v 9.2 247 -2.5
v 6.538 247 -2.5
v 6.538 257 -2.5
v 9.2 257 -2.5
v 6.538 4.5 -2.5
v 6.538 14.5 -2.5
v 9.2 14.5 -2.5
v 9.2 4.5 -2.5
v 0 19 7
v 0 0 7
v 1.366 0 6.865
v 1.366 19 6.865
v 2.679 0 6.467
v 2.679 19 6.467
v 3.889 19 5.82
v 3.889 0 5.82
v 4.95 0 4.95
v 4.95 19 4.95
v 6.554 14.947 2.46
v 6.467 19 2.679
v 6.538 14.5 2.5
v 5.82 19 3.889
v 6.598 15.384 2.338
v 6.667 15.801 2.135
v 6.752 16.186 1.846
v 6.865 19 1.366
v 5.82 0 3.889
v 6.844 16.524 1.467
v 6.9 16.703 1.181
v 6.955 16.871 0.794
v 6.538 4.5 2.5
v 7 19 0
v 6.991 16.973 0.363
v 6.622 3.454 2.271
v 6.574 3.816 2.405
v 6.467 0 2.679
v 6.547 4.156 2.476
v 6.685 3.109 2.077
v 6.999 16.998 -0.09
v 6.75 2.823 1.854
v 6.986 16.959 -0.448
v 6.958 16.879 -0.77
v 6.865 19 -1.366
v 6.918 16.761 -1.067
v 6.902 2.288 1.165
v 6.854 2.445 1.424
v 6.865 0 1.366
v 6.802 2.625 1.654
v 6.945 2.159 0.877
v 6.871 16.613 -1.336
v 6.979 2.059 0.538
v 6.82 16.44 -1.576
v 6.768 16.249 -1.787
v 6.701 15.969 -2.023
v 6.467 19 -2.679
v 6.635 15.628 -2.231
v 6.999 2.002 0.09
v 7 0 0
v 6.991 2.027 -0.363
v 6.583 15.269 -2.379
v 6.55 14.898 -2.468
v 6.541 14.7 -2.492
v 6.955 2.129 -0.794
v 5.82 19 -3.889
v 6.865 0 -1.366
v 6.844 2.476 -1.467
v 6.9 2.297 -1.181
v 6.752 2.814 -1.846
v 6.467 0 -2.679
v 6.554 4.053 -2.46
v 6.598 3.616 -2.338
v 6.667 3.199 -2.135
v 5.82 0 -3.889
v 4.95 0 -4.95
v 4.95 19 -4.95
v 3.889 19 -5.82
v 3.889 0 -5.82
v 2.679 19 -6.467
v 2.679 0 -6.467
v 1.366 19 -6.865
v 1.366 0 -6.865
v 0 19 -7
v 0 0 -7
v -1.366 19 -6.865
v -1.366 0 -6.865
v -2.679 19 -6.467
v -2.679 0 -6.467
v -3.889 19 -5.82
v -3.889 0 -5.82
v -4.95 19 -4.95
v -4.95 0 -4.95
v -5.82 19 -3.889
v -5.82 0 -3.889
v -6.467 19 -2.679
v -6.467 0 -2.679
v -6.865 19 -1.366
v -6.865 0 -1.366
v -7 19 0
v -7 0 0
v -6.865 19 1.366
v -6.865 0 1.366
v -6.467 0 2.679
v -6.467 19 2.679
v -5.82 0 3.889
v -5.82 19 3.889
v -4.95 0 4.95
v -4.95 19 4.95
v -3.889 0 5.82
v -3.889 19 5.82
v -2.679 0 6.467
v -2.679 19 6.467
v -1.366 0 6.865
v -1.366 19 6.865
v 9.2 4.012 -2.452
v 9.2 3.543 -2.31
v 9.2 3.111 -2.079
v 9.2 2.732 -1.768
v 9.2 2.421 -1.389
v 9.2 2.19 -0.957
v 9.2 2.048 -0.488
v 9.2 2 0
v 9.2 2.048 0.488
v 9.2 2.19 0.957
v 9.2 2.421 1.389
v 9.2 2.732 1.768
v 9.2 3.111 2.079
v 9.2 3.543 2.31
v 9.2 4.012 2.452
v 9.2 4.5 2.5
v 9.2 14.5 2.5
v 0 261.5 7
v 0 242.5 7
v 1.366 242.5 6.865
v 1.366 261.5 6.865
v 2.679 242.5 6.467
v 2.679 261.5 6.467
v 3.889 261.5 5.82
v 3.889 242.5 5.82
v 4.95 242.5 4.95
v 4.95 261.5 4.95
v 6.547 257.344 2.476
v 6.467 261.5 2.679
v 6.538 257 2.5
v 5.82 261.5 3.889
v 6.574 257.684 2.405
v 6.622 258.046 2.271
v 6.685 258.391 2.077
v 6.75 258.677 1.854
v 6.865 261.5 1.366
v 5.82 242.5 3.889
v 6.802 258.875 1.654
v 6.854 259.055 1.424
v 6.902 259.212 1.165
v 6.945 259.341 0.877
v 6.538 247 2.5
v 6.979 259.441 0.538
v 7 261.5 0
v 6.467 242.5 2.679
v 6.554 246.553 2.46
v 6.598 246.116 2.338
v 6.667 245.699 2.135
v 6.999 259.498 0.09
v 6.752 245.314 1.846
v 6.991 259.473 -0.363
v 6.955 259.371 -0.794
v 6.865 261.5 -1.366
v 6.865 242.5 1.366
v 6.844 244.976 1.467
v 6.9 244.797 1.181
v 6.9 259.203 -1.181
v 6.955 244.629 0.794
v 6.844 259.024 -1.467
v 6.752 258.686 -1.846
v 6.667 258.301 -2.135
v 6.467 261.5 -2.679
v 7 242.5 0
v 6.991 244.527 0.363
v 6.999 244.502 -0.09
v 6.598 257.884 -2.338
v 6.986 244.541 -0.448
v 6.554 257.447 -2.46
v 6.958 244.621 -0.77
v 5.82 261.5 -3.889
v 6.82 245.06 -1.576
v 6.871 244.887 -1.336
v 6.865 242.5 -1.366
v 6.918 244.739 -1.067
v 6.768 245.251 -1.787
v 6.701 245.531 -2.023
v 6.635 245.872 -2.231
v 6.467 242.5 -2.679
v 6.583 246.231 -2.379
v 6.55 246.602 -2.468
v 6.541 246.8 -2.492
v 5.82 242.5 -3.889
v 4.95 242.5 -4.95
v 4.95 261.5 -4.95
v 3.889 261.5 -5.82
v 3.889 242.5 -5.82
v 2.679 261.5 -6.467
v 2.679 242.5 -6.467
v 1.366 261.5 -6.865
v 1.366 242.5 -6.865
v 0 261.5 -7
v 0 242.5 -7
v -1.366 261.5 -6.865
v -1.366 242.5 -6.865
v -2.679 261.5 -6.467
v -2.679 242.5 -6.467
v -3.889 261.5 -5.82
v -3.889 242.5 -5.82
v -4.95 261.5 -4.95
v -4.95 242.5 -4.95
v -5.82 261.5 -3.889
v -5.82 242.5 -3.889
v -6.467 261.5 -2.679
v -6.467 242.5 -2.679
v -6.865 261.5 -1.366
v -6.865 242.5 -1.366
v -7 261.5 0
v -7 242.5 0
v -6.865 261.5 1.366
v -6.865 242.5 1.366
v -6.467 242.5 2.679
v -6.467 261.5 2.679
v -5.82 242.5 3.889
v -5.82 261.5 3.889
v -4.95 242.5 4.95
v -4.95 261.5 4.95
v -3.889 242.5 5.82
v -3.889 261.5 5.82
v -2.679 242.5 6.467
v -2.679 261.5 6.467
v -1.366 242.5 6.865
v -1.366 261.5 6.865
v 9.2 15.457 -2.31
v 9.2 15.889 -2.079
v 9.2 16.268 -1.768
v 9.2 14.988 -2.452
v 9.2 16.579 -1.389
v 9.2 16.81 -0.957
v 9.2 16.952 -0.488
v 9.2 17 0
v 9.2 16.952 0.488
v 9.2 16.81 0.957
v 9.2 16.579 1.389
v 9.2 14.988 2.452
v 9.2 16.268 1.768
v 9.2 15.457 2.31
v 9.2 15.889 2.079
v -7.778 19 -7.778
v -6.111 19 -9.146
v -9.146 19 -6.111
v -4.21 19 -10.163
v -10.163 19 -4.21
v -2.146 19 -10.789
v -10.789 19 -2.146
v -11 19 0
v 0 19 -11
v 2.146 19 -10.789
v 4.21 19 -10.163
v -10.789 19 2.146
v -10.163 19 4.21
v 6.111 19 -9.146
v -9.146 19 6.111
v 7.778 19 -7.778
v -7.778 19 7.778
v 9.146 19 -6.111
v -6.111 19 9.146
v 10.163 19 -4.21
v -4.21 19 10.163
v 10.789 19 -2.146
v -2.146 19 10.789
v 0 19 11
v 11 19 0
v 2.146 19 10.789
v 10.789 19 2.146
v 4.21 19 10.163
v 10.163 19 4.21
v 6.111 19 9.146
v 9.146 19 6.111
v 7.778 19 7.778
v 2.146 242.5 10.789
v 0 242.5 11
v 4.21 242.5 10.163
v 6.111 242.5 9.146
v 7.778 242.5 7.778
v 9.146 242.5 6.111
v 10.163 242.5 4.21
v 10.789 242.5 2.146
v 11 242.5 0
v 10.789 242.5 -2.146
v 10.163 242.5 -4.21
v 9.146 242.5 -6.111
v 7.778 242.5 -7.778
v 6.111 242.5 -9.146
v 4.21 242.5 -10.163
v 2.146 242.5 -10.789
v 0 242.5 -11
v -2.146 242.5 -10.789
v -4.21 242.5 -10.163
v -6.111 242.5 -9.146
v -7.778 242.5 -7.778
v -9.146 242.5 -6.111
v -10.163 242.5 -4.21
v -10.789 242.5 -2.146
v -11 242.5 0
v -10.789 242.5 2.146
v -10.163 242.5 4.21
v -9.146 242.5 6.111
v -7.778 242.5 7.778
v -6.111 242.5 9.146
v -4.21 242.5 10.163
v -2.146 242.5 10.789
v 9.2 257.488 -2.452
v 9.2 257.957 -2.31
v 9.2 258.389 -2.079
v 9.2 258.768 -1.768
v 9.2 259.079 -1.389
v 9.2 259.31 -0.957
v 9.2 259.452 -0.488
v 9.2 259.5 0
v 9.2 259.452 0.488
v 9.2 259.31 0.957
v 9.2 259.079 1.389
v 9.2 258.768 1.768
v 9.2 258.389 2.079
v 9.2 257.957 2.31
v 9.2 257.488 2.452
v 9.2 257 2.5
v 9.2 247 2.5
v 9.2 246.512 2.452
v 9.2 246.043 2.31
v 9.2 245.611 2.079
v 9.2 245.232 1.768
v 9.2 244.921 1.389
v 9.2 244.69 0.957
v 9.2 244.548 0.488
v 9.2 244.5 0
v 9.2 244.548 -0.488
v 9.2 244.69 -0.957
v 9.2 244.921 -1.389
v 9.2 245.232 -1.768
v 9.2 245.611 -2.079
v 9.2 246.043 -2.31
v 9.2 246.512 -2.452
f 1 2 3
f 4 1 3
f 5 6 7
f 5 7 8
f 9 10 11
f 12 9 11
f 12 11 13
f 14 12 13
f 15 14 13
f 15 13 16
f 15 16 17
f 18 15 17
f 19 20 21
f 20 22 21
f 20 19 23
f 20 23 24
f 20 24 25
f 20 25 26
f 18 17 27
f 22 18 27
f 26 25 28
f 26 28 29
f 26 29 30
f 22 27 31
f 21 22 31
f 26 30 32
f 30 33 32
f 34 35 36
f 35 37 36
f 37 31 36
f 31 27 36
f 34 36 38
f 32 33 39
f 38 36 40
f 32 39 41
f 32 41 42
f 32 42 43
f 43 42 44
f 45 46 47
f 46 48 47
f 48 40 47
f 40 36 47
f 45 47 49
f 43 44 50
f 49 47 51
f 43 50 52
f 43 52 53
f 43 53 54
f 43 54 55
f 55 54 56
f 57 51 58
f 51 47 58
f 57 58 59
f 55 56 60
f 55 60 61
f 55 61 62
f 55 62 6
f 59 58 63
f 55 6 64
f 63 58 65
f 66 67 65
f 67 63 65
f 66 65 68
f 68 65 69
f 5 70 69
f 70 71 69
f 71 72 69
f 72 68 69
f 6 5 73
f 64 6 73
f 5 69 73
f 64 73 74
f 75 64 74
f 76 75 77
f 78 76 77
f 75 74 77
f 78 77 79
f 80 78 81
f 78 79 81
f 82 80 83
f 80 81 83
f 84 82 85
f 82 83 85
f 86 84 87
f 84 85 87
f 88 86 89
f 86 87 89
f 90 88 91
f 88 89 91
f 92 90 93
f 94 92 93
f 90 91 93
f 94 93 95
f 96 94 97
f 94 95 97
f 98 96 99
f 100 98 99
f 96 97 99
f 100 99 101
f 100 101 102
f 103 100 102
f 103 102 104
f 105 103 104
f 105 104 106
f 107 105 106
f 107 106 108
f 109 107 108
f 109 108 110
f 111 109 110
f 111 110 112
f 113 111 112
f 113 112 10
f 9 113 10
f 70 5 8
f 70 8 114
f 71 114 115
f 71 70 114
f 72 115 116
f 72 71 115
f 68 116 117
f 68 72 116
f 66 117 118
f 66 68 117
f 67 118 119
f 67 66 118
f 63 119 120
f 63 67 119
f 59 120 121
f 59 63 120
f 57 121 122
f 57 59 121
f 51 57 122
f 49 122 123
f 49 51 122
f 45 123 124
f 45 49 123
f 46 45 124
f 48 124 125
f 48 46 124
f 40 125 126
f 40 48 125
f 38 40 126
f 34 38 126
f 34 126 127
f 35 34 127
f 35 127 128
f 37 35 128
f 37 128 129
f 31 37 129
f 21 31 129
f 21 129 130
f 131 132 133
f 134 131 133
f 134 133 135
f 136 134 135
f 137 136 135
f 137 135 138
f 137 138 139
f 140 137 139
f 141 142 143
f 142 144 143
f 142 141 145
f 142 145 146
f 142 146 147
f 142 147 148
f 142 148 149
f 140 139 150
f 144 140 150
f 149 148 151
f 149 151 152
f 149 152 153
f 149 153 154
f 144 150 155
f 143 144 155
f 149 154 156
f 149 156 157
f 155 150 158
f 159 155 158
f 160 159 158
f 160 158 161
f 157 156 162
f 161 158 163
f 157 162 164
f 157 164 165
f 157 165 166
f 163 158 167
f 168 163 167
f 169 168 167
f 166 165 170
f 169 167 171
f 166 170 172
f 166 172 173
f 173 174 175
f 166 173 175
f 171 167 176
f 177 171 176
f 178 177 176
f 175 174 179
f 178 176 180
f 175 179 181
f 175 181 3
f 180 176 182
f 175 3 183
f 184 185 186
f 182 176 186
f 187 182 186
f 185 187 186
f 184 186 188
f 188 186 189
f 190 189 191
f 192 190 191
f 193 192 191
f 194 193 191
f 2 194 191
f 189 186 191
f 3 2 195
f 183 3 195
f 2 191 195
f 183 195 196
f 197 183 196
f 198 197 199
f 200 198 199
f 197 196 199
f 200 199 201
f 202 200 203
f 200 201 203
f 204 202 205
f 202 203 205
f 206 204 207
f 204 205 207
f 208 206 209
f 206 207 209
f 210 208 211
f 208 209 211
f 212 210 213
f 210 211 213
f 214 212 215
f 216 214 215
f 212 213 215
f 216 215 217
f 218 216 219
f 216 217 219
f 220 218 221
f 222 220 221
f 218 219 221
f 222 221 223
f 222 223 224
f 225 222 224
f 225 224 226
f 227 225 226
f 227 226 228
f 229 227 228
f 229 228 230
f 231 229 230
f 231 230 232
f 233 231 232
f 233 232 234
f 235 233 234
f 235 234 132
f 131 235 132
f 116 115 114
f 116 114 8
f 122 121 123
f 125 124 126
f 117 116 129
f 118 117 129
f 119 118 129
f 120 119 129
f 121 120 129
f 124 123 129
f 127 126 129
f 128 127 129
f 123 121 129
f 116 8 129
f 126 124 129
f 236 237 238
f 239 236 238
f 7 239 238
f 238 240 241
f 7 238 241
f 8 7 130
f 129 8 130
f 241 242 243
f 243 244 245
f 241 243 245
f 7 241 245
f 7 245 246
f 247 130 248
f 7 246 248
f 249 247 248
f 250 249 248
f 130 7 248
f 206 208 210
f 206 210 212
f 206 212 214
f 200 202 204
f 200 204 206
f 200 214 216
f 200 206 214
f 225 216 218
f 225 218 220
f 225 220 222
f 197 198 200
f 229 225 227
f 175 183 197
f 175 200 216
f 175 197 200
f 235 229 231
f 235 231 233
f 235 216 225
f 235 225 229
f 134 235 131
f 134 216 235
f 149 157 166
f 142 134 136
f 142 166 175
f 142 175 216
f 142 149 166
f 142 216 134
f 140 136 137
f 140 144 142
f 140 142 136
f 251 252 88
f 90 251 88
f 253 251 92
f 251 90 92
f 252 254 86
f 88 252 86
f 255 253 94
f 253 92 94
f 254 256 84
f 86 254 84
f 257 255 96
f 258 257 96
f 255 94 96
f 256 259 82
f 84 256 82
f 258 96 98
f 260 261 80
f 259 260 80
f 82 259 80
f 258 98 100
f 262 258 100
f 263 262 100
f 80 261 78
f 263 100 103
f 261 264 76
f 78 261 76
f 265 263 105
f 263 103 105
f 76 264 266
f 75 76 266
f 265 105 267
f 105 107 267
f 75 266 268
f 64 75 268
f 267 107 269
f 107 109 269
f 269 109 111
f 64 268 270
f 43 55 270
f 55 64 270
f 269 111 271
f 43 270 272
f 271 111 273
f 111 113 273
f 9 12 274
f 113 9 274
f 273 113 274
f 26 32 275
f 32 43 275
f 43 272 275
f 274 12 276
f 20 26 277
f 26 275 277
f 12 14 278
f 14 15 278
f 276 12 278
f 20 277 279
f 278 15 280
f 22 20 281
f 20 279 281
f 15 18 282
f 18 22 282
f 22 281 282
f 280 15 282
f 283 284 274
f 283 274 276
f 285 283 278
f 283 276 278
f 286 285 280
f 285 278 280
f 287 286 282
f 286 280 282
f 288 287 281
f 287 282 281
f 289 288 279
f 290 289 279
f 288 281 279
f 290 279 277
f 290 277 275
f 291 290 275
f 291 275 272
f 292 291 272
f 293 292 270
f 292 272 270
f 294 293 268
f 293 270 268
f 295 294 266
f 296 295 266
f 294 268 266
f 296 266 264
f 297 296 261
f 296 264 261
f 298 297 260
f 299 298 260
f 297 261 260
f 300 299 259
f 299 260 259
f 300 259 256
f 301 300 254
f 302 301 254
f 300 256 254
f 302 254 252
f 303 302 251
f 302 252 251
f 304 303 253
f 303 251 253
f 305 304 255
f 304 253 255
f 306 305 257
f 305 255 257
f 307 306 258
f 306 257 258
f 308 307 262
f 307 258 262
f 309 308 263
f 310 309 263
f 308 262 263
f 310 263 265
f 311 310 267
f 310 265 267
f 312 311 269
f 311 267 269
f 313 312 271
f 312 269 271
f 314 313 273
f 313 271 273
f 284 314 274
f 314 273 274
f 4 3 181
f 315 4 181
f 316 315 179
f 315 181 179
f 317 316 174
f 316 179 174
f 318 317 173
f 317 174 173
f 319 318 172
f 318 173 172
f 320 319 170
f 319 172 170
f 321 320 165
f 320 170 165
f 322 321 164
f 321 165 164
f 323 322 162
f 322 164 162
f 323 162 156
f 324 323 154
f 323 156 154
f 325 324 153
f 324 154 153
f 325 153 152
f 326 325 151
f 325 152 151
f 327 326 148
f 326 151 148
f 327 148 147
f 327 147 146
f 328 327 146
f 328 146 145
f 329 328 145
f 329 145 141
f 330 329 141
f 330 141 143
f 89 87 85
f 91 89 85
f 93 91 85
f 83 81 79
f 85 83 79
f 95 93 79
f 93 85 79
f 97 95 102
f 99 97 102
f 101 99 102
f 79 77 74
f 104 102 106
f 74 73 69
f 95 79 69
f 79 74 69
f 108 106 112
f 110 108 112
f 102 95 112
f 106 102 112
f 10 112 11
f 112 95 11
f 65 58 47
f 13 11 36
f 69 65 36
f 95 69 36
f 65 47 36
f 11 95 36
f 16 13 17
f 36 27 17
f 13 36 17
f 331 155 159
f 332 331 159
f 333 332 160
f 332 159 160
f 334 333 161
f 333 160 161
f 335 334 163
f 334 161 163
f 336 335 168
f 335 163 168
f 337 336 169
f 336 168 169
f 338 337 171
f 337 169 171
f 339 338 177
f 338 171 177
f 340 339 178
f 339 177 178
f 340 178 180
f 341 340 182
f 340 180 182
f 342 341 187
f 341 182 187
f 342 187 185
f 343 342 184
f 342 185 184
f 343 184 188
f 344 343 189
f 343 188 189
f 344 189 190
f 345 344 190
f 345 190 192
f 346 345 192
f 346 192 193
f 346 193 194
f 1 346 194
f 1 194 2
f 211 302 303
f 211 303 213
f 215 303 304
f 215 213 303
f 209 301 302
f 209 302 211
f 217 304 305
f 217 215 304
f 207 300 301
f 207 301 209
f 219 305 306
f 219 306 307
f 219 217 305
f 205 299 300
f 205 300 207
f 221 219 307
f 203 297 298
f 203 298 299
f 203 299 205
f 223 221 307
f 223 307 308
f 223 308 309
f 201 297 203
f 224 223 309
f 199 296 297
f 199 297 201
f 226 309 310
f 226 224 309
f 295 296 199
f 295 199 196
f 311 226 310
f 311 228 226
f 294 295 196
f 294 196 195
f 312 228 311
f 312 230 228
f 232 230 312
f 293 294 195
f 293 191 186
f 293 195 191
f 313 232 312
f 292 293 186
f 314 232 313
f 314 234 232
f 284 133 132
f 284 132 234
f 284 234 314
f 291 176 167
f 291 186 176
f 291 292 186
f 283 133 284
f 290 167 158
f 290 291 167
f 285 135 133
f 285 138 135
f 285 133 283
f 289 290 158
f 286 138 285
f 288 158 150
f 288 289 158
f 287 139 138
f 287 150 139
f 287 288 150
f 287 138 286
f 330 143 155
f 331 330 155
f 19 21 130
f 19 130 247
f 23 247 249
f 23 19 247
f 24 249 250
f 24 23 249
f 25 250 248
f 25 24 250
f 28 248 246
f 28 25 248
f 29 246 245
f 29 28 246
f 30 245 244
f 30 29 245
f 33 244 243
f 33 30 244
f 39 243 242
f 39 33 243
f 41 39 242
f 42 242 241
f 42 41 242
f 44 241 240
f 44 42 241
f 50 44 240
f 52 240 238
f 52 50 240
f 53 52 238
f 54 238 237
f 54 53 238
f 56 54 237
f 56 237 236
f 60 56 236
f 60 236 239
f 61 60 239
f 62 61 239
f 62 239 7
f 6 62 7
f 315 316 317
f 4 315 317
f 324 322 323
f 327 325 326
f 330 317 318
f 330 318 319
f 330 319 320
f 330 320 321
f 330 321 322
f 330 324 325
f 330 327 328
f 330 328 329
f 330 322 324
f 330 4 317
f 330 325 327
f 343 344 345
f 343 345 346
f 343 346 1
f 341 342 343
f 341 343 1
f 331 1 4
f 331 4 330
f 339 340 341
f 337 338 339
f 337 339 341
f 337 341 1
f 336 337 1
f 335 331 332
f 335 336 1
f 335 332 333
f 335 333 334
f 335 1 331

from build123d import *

# Parameters (mm, degrees)
SKETCH1_R           = 7
BOSS_EXTRUDE1_DEPTH = 19
SKETCH2_R           = 11
BOSS_EXTRUDE2_DEPTH = 223.5
SKETCH3_R           = 7
BOSS_EXTRUDE3_DEPTH = 19
BOSS_EXTRUDE4_START = -3
BOSS_EXTRUDE4_DEPTH = 5.2


with BuildPart() as part:
    # Sketch1 → Boss-Extrude1 (new body)
    with BuildSketch(Plane(origin=(0, 0, 0), x_dir=(1, 0, 0), z_dir=(0, 1, 0))):
        Circle(SKETCH1_R)
    extrude(amount=BOSS_EXTRUDE1_DEPTH)

    # Sketch2 → Boss-Extrude2 (add)
    with BuildSketch(Plane(origin=(0, 19, 0), x_dir=(1, 0, 0), z_dir=(0, 1, 0))):
        Circle(SKETCH2_R)
    extrude(amount=BOSS_EXTRUDE2_DEPTH)

    # Sketch3 → Boss-Extrude3 (add)
    with BuildSketch(Plane(origin=(0, 242.5, 0), x_dir=(1, 0, 0), z_dir=(0, 1, 0))):
        Circle(SKETCH3_R)
    extrude(amount=BOSS_EXTRUDE3_DEPTH)

    # Sketch4 → Boss-Extrude4 (add)
    with BuildSketch(Plane(origin=(7, 0, 0), x_dir=(0, 0, -1), z_dir=(1, 0, 0)).offset(BOSS_EXTRUDE4_START)):
        with BuildLine():
            Line((-2.5, 4.5), (-2.5, 14.5))
            ThreePointArc((-2.5, 14.5), (0, 17), (2.5, 14.5))
            Line((2.5, 14.5), (2.5, 4.5))
            ThreePointArc((2.5, 4.5), (0, 2), (-2.5, 4.5))
        make_face()
    boss_extrude4 = extrude(amount=BOSS_EXTRUDE4_DEPTH)

    # Mirror1: Boss-Extrude4 across plane
    add(boss_extrude4.mirror(Plane.ZX.offset(130.75)))


solid = part.part
